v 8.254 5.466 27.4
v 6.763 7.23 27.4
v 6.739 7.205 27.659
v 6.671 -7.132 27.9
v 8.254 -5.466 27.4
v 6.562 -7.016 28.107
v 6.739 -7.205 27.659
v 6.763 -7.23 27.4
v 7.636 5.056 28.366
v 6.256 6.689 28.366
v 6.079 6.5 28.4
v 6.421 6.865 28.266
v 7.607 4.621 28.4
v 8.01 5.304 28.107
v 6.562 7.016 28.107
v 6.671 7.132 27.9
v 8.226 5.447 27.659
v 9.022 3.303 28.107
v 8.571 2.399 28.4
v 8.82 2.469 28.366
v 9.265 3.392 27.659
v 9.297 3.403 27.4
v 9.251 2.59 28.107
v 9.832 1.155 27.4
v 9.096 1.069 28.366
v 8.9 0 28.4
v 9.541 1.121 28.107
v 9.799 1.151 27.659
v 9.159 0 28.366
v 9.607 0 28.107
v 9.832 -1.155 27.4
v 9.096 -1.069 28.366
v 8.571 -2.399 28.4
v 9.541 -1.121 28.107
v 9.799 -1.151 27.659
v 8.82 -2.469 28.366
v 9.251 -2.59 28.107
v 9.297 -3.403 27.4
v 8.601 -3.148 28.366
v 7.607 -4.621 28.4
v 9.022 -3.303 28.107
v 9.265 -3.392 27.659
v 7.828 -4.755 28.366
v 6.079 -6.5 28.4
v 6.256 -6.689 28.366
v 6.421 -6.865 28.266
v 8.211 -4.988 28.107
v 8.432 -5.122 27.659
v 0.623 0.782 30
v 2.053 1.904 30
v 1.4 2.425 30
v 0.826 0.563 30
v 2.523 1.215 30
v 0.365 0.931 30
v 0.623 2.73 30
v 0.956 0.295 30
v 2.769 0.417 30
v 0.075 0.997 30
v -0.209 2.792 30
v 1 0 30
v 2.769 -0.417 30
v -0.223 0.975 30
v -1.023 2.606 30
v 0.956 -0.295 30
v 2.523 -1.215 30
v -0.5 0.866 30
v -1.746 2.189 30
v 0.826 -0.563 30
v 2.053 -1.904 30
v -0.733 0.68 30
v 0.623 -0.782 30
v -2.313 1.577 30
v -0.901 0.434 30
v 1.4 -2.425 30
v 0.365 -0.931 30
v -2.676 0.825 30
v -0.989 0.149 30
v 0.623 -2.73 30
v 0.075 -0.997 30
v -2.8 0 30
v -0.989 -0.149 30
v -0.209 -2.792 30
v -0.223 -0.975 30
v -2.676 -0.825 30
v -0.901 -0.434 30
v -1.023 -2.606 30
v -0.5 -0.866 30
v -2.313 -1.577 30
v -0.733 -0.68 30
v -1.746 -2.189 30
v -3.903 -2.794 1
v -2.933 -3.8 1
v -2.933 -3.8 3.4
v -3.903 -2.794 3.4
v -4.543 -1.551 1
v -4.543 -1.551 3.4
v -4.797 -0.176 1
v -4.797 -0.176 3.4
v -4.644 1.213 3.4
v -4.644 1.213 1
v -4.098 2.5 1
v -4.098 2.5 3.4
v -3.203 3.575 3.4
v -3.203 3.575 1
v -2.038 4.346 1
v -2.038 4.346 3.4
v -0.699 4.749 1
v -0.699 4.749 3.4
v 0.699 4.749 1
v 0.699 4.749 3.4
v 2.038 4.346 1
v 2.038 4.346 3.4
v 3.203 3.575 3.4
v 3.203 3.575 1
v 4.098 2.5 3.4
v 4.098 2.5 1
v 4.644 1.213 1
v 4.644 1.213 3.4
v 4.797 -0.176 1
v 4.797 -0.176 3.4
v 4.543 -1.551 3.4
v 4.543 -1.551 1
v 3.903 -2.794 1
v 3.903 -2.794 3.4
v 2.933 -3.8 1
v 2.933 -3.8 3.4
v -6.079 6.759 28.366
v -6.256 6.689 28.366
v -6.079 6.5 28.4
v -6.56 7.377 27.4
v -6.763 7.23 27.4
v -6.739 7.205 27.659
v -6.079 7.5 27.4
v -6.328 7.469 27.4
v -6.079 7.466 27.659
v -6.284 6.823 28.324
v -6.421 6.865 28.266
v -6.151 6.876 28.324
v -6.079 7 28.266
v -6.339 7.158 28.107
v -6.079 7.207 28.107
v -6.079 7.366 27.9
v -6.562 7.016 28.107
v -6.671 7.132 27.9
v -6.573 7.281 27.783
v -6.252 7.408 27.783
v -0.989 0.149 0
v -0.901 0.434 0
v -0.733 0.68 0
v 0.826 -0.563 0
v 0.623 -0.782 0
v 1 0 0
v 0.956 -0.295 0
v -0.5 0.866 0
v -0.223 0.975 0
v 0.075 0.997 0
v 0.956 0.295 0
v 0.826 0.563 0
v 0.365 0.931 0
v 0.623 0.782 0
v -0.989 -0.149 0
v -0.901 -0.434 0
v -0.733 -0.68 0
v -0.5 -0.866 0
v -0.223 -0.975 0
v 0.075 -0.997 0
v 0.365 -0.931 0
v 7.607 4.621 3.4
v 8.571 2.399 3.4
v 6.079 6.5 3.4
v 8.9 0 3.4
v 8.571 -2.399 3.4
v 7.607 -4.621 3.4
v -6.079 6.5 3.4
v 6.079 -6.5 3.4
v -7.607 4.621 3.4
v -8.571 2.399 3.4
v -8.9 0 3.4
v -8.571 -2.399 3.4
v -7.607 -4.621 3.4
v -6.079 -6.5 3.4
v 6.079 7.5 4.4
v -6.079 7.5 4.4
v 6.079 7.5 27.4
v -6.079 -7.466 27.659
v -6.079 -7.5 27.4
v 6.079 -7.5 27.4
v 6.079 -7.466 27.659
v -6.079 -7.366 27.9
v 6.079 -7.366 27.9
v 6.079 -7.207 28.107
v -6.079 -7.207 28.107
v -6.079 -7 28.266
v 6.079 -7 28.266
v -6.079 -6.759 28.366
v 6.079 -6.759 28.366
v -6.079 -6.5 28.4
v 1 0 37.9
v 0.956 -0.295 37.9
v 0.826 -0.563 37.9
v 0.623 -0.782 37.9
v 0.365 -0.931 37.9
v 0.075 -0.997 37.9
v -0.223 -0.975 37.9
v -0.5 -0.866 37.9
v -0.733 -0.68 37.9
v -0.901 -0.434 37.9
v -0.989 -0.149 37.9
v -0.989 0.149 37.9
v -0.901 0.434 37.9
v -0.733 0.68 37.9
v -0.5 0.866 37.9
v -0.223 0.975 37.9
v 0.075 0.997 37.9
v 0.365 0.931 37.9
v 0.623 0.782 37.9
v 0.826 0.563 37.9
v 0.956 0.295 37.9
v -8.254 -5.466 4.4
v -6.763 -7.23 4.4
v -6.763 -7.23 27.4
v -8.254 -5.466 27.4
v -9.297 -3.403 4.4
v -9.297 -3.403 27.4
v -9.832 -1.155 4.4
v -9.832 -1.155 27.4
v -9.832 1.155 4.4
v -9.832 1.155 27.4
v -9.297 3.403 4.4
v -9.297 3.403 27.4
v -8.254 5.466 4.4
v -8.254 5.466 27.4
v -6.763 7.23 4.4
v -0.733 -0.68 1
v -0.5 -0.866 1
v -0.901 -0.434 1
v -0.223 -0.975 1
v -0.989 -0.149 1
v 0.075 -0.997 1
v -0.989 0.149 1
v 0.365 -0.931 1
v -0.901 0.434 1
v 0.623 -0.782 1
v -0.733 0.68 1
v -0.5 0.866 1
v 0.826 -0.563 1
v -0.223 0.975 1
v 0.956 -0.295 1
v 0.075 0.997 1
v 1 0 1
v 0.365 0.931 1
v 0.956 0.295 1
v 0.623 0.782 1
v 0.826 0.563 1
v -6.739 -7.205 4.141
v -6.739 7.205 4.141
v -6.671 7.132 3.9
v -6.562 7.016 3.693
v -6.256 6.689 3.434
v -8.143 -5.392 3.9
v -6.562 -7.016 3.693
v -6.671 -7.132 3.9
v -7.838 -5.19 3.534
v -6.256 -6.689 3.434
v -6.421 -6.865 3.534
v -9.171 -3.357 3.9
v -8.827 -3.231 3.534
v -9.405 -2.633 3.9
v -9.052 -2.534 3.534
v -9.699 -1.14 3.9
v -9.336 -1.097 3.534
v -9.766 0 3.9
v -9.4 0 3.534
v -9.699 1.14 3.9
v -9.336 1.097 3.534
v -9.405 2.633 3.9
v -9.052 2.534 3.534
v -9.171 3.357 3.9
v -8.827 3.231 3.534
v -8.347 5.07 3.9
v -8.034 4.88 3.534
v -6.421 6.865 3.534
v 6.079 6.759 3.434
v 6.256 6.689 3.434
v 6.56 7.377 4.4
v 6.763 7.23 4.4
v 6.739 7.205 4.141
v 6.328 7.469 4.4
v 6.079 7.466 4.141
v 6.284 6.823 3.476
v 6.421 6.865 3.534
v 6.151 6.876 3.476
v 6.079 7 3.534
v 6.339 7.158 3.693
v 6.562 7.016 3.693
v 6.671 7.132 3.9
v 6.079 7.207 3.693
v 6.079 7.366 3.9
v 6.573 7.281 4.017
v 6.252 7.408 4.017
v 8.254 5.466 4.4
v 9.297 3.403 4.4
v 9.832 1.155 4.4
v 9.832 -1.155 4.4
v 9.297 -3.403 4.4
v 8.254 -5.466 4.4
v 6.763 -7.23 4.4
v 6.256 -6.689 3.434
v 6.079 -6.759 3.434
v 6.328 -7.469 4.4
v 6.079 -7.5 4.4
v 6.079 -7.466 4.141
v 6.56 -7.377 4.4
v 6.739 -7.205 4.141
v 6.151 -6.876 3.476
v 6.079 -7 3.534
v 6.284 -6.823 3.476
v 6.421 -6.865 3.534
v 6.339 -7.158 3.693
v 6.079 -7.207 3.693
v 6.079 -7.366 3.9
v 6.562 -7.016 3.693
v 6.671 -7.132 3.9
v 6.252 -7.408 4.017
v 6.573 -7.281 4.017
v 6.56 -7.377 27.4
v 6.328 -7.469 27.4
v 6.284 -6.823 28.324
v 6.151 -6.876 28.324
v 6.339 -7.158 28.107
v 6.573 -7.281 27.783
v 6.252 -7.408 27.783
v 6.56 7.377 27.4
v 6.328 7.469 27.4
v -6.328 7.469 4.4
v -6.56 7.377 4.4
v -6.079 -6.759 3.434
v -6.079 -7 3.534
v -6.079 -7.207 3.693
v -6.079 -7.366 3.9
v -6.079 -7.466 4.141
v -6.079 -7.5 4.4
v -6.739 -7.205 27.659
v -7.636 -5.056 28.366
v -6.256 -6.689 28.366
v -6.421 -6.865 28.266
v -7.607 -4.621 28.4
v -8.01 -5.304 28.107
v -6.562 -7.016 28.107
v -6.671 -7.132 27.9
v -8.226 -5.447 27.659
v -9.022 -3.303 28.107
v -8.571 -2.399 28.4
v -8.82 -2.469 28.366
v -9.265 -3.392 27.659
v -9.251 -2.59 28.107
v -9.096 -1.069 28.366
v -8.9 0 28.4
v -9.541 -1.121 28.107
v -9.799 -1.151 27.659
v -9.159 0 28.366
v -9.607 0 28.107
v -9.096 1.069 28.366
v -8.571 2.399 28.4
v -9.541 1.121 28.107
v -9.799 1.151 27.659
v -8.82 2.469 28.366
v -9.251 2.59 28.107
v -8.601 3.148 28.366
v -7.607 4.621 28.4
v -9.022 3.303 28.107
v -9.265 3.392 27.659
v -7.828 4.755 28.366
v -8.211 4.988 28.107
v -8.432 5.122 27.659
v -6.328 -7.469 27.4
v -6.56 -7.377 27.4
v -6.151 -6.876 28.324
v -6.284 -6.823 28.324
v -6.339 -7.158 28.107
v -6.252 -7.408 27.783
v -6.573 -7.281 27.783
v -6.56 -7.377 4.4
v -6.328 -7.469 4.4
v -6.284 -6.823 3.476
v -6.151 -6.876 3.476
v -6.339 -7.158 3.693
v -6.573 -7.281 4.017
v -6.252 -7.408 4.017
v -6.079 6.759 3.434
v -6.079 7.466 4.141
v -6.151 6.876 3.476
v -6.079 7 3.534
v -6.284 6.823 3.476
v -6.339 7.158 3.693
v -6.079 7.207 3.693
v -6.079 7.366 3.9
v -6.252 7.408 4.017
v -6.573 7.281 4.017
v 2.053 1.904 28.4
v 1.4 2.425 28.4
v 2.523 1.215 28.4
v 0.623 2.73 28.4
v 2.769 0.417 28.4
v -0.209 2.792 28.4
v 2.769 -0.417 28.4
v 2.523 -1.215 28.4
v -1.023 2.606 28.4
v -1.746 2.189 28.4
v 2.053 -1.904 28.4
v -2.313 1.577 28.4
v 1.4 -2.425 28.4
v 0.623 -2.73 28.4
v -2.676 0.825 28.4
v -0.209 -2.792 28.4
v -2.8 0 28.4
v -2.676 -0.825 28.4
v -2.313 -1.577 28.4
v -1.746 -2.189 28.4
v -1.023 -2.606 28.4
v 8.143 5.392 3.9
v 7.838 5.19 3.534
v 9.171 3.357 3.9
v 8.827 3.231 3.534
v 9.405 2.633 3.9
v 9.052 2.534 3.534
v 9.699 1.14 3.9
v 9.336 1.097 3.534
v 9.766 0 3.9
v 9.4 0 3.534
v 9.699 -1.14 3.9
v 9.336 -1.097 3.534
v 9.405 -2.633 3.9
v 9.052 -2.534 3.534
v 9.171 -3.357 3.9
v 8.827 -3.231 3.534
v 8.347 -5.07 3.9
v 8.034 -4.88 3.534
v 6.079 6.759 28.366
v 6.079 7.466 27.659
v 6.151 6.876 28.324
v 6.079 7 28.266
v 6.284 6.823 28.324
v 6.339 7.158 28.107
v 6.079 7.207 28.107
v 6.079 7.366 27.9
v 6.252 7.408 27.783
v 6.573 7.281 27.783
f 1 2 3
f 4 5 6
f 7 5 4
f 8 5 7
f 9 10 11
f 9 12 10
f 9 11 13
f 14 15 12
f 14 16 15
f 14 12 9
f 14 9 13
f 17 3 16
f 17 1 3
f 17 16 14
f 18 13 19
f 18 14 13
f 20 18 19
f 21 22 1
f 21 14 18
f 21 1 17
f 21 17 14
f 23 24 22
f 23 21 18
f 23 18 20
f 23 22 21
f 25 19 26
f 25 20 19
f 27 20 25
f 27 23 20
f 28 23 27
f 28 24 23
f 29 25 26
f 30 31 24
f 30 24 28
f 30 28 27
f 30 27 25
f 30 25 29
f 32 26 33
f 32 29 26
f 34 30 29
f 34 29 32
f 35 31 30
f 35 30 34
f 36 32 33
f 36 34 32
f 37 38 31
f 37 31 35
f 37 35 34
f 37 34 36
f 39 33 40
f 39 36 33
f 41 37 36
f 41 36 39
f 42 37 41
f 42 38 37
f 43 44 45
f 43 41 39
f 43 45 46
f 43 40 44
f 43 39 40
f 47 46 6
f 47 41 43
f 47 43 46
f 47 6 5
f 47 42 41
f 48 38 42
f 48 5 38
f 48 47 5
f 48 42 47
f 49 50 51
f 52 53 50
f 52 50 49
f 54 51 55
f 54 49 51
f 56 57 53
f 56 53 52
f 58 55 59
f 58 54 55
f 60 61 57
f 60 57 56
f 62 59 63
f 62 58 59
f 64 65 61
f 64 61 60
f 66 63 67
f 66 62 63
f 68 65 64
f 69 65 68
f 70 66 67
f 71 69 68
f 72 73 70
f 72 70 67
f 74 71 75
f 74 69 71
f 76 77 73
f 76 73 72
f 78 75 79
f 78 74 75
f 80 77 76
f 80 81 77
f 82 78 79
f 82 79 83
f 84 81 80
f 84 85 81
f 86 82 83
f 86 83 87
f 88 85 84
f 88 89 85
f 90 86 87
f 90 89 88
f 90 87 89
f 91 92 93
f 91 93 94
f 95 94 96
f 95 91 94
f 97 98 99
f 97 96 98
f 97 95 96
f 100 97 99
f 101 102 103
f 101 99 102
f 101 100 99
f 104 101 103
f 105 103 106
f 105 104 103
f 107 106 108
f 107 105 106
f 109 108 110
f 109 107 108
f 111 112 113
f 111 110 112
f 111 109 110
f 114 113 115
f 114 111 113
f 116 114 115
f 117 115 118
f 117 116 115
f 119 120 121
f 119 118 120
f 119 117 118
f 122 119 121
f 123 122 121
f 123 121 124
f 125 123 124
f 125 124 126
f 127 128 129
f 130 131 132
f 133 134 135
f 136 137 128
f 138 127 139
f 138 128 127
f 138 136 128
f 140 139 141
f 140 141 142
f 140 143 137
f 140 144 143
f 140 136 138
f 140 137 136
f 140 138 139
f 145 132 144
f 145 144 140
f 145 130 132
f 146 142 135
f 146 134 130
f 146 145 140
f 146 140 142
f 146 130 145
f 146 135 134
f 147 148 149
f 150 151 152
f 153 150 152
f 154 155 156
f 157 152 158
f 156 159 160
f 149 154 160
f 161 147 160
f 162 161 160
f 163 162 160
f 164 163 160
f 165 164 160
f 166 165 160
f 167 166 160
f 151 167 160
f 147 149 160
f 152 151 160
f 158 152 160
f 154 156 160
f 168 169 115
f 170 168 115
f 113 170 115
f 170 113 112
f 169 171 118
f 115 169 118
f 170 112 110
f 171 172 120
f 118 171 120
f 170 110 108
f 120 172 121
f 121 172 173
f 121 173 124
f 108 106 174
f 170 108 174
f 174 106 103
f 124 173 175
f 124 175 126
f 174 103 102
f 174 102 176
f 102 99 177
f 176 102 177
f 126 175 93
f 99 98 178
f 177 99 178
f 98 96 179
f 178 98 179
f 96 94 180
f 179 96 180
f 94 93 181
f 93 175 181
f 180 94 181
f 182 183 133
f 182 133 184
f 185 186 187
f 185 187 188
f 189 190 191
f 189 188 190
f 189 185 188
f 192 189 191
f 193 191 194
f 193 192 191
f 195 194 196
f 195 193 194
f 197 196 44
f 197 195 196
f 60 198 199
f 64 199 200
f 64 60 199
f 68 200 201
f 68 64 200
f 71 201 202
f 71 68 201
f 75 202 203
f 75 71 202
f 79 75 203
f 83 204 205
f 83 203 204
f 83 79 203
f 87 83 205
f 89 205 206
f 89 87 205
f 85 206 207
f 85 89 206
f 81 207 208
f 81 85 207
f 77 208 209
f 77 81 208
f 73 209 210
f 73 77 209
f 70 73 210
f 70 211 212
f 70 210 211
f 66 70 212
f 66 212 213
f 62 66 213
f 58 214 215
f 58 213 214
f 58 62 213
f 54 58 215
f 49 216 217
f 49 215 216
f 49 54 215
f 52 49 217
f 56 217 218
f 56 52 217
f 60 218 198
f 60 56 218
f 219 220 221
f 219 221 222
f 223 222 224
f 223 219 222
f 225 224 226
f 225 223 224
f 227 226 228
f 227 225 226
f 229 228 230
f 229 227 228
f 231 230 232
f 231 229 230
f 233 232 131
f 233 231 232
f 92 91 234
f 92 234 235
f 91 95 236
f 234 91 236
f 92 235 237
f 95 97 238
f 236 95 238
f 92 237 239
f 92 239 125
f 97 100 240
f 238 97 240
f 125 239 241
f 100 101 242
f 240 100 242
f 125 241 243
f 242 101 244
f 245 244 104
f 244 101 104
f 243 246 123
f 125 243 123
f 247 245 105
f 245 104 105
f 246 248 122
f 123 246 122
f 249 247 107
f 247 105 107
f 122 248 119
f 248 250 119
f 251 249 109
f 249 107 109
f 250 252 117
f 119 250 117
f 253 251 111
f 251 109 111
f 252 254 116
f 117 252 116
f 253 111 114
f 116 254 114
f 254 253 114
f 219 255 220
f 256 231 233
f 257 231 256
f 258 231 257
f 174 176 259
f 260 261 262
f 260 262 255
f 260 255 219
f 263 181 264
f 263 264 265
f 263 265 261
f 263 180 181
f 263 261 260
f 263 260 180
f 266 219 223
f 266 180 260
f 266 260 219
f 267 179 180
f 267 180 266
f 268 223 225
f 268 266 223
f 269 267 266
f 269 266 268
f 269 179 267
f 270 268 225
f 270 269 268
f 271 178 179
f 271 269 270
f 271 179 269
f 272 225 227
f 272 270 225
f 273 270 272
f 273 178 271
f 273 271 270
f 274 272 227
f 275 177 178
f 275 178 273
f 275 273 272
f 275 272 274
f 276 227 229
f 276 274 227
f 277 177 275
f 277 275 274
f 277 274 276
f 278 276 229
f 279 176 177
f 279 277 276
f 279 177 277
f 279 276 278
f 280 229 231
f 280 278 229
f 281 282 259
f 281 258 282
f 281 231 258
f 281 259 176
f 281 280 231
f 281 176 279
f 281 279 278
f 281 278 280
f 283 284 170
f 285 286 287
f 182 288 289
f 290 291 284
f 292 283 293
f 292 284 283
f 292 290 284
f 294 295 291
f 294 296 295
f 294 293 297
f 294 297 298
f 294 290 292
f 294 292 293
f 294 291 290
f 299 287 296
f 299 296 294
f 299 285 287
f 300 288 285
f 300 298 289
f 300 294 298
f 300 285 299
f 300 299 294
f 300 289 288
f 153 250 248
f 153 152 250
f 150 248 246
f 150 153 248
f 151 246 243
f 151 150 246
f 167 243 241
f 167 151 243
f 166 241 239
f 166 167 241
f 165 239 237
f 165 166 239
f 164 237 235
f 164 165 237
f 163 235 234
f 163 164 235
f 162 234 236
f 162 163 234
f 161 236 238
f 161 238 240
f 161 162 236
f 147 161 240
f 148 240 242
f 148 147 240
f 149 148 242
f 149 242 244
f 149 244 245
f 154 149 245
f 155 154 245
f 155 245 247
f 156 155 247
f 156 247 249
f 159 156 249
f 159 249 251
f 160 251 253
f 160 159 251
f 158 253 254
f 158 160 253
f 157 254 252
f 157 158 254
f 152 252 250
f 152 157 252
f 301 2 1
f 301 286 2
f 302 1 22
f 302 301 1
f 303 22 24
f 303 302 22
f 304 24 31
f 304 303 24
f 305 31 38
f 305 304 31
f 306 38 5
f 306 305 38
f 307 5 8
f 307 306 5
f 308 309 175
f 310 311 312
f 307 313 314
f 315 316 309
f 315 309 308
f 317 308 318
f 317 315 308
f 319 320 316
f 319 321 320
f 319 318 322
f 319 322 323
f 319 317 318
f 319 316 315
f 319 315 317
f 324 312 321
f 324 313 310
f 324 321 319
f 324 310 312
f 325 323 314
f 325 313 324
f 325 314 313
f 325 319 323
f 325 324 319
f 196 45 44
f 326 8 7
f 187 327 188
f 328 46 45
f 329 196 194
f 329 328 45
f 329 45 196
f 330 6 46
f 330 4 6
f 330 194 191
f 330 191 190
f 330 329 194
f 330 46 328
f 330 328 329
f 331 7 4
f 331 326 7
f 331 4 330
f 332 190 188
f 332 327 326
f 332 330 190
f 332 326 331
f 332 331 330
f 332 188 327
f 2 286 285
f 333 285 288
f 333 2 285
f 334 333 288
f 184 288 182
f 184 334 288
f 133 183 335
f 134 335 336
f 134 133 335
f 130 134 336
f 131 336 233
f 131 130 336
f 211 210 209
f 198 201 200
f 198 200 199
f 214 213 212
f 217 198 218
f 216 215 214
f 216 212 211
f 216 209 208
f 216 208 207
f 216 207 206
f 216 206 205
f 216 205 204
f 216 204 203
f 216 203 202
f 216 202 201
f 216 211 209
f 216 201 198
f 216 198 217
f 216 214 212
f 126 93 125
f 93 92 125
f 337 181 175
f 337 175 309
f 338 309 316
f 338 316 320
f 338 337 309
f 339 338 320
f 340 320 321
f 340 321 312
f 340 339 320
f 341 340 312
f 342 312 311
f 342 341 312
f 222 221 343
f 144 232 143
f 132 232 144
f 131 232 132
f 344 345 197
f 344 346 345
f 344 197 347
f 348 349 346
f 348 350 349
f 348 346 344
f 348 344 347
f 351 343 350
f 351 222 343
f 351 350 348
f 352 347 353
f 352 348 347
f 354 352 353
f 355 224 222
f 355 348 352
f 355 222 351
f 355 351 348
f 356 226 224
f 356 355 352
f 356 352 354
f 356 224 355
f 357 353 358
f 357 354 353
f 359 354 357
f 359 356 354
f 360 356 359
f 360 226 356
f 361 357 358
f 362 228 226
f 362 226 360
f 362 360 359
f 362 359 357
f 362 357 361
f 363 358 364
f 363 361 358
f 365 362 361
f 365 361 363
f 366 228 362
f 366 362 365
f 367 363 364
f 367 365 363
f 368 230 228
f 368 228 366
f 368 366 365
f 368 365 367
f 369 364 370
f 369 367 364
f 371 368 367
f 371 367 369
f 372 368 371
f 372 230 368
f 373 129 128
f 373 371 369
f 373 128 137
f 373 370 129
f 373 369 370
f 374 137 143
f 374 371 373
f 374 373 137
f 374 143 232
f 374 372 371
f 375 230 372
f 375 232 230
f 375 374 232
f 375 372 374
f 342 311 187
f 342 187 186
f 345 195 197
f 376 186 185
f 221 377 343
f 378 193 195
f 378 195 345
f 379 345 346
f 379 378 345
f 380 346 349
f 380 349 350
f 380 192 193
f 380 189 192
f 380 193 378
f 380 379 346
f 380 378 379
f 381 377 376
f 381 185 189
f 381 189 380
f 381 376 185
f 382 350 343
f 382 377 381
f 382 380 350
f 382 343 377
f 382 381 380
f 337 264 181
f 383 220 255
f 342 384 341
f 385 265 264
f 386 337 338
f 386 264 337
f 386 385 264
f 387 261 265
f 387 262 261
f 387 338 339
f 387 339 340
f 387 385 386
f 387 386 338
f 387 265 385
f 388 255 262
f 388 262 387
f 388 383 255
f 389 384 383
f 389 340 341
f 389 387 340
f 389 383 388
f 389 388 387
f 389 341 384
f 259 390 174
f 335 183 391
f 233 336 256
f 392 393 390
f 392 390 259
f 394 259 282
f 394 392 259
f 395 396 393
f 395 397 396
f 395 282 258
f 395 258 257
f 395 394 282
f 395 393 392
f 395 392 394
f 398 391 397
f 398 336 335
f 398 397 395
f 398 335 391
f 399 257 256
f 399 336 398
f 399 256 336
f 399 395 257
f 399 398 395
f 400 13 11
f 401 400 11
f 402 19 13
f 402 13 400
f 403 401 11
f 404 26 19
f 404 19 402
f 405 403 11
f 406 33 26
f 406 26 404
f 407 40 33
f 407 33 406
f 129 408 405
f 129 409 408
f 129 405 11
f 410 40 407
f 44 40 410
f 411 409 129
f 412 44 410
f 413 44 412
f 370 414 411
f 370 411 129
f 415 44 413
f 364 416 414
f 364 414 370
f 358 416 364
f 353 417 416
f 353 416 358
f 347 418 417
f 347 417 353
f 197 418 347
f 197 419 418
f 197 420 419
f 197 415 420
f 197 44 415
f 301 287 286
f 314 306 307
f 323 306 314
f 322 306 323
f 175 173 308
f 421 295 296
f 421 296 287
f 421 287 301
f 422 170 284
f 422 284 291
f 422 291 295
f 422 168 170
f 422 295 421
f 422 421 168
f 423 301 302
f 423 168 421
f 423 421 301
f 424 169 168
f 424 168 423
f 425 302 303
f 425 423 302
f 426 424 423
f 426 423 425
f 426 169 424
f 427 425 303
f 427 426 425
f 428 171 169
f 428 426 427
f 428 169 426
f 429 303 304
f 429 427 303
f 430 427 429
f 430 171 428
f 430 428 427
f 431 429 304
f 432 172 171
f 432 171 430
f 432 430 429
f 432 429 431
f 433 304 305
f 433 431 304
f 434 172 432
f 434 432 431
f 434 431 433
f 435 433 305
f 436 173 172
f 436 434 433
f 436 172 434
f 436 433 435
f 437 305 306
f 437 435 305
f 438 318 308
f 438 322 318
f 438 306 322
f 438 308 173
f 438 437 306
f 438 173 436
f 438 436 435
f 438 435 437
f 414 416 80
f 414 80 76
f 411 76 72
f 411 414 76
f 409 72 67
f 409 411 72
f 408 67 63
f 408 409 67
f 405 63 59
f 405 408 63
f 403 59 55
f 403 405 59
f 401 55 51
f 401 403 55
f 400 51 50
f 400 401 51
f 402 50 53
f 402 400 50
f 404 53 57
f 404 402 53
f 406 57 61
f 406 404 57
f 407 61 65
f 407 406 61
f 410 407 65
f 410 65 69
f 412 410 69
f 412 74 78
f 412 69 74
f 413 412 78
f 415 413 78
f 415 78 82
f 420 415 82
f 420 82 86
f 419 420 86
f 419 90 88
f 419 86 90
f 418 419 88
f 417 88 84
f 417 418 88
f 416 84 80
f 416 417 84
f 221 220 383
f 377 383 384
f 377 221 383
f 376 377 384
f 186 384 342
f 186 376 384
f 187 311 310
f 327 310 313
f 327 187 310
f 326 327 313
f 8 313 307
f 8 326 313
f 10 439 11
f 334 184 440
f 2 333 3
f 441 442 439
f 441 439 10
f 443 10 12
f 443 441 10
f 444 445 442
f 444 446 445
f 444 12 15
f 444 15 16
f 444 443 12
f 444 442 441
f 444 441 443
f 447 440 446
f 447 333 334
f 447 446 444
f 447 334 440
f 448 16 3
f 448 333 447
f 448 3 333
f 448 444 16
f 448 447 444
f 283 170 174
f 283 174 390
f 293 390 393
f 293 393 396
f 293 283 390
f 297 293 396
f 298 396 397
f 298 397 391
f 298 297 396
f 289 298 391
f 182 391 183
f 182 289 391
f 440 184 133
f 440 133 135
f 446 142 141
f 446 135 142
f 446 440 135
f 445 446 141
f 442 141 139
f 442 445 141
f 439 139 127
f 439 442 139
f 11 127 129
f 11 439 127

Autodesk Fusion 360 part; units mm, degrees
sketch "Schizzo1" plane through (0, 0, 0) normal (0, 0, 1) x (1, 0, 0)
  circle A0 centre (0, 0) radius 1
  dimension "d1" = 2
extrude "Estrudi1" add sketch "Schizzo1" along normal blind 37.9
sketch "Schizzo2" plane through (0, 0, 0) normal (0, 1, 0) x (1, 0, 0)
sketch "Schizzo3" plane through (0, 0, 0) normal (0, 0, 1) x (1, 0, 0)
  line L0 (-2.9326, -3.8) -> (2.9326, -3.8)
  arc A0 (2.9326, -3.8) -> (-2.9326, -3.8) centre (0, 0) ccw
  point P0 (0, 4.8)
  dimension "d4" = 9.6
  dimension "d6" = 3.8
  dimension "d7" = 8.6
extrude "Estrudi2" add sketch "Schizzo3" along normal blind 2.4 from surface at 1
sketch "Schizzo4" plane through (0, 0, 3.4) normal (0, 0, 1) x (-1, 0, 0)
  arc A0 (-2.9326, 3.8) -> (2.9326, 3.8) centre (0, 0) ccw
  line L0 (2.9326, 3.8) -> (-2.9326, 3.8)
  circle A1 centre (0, 0) radius 1
  line L1 (6.4622, -7.5) -> (-6.4622, -7.5)
  line L2 (-6.4622, 7.5) -> (6.4622, 7.5)
  arc A2 (-6.4622, 7.5) -> (-6.4622, -7.5) centre (0, 0) ccw
  arc A3 (6.4622, -7.5) -> (6.4622, 7.5) centre (0, 0) ccw
  dimension "d11" = 19.8
  dimension "d12" = 7.5
  dimension "d21" = 15
extrude "Estrudi3" add sketch "Schizzo4" along normal blind 25 contours A0 L0 | L1 L2 A2 A3
sketch "Schizzo5" plane through (0, 0, 28.4) normal (0, 0, 1) x (-1, 0, 0)
  circle A0 centre (0, 0) radius 1
  arc A1 (-6.4622, 7.5) -> (-6.4622, -7.5) centre (0, 0) ccw
  line L0 (-6.4622, -7.5) -> (6.4622, -7.5)
  arc A2 (6.4622, -7.5) -> (6.4622, 7.5) centre (0, 0) ccw
  line L1 (6.4622, 7.5) -> (-6.4622, 7.5)
  circle A3 centre (0, 0) radius 2.8
  dimension "d16" = 5.6
extrude "Estrudi4" add sketch "Schizzo5" along normal blind 1.6 contours A3
fillet "Raccordo1" radius 1 4 faces at (-2.1541, 7.5, 11.7333) (2.1541, -7.5, 11.7333) (7.7686, 6.1367, 20.0667) (-7.7686, -6.1367, 20.0667)
equation "d9 = 3.4 mm - 1 mm"
equation "d12 = ( 15 / 2 ) * 1 mm"
